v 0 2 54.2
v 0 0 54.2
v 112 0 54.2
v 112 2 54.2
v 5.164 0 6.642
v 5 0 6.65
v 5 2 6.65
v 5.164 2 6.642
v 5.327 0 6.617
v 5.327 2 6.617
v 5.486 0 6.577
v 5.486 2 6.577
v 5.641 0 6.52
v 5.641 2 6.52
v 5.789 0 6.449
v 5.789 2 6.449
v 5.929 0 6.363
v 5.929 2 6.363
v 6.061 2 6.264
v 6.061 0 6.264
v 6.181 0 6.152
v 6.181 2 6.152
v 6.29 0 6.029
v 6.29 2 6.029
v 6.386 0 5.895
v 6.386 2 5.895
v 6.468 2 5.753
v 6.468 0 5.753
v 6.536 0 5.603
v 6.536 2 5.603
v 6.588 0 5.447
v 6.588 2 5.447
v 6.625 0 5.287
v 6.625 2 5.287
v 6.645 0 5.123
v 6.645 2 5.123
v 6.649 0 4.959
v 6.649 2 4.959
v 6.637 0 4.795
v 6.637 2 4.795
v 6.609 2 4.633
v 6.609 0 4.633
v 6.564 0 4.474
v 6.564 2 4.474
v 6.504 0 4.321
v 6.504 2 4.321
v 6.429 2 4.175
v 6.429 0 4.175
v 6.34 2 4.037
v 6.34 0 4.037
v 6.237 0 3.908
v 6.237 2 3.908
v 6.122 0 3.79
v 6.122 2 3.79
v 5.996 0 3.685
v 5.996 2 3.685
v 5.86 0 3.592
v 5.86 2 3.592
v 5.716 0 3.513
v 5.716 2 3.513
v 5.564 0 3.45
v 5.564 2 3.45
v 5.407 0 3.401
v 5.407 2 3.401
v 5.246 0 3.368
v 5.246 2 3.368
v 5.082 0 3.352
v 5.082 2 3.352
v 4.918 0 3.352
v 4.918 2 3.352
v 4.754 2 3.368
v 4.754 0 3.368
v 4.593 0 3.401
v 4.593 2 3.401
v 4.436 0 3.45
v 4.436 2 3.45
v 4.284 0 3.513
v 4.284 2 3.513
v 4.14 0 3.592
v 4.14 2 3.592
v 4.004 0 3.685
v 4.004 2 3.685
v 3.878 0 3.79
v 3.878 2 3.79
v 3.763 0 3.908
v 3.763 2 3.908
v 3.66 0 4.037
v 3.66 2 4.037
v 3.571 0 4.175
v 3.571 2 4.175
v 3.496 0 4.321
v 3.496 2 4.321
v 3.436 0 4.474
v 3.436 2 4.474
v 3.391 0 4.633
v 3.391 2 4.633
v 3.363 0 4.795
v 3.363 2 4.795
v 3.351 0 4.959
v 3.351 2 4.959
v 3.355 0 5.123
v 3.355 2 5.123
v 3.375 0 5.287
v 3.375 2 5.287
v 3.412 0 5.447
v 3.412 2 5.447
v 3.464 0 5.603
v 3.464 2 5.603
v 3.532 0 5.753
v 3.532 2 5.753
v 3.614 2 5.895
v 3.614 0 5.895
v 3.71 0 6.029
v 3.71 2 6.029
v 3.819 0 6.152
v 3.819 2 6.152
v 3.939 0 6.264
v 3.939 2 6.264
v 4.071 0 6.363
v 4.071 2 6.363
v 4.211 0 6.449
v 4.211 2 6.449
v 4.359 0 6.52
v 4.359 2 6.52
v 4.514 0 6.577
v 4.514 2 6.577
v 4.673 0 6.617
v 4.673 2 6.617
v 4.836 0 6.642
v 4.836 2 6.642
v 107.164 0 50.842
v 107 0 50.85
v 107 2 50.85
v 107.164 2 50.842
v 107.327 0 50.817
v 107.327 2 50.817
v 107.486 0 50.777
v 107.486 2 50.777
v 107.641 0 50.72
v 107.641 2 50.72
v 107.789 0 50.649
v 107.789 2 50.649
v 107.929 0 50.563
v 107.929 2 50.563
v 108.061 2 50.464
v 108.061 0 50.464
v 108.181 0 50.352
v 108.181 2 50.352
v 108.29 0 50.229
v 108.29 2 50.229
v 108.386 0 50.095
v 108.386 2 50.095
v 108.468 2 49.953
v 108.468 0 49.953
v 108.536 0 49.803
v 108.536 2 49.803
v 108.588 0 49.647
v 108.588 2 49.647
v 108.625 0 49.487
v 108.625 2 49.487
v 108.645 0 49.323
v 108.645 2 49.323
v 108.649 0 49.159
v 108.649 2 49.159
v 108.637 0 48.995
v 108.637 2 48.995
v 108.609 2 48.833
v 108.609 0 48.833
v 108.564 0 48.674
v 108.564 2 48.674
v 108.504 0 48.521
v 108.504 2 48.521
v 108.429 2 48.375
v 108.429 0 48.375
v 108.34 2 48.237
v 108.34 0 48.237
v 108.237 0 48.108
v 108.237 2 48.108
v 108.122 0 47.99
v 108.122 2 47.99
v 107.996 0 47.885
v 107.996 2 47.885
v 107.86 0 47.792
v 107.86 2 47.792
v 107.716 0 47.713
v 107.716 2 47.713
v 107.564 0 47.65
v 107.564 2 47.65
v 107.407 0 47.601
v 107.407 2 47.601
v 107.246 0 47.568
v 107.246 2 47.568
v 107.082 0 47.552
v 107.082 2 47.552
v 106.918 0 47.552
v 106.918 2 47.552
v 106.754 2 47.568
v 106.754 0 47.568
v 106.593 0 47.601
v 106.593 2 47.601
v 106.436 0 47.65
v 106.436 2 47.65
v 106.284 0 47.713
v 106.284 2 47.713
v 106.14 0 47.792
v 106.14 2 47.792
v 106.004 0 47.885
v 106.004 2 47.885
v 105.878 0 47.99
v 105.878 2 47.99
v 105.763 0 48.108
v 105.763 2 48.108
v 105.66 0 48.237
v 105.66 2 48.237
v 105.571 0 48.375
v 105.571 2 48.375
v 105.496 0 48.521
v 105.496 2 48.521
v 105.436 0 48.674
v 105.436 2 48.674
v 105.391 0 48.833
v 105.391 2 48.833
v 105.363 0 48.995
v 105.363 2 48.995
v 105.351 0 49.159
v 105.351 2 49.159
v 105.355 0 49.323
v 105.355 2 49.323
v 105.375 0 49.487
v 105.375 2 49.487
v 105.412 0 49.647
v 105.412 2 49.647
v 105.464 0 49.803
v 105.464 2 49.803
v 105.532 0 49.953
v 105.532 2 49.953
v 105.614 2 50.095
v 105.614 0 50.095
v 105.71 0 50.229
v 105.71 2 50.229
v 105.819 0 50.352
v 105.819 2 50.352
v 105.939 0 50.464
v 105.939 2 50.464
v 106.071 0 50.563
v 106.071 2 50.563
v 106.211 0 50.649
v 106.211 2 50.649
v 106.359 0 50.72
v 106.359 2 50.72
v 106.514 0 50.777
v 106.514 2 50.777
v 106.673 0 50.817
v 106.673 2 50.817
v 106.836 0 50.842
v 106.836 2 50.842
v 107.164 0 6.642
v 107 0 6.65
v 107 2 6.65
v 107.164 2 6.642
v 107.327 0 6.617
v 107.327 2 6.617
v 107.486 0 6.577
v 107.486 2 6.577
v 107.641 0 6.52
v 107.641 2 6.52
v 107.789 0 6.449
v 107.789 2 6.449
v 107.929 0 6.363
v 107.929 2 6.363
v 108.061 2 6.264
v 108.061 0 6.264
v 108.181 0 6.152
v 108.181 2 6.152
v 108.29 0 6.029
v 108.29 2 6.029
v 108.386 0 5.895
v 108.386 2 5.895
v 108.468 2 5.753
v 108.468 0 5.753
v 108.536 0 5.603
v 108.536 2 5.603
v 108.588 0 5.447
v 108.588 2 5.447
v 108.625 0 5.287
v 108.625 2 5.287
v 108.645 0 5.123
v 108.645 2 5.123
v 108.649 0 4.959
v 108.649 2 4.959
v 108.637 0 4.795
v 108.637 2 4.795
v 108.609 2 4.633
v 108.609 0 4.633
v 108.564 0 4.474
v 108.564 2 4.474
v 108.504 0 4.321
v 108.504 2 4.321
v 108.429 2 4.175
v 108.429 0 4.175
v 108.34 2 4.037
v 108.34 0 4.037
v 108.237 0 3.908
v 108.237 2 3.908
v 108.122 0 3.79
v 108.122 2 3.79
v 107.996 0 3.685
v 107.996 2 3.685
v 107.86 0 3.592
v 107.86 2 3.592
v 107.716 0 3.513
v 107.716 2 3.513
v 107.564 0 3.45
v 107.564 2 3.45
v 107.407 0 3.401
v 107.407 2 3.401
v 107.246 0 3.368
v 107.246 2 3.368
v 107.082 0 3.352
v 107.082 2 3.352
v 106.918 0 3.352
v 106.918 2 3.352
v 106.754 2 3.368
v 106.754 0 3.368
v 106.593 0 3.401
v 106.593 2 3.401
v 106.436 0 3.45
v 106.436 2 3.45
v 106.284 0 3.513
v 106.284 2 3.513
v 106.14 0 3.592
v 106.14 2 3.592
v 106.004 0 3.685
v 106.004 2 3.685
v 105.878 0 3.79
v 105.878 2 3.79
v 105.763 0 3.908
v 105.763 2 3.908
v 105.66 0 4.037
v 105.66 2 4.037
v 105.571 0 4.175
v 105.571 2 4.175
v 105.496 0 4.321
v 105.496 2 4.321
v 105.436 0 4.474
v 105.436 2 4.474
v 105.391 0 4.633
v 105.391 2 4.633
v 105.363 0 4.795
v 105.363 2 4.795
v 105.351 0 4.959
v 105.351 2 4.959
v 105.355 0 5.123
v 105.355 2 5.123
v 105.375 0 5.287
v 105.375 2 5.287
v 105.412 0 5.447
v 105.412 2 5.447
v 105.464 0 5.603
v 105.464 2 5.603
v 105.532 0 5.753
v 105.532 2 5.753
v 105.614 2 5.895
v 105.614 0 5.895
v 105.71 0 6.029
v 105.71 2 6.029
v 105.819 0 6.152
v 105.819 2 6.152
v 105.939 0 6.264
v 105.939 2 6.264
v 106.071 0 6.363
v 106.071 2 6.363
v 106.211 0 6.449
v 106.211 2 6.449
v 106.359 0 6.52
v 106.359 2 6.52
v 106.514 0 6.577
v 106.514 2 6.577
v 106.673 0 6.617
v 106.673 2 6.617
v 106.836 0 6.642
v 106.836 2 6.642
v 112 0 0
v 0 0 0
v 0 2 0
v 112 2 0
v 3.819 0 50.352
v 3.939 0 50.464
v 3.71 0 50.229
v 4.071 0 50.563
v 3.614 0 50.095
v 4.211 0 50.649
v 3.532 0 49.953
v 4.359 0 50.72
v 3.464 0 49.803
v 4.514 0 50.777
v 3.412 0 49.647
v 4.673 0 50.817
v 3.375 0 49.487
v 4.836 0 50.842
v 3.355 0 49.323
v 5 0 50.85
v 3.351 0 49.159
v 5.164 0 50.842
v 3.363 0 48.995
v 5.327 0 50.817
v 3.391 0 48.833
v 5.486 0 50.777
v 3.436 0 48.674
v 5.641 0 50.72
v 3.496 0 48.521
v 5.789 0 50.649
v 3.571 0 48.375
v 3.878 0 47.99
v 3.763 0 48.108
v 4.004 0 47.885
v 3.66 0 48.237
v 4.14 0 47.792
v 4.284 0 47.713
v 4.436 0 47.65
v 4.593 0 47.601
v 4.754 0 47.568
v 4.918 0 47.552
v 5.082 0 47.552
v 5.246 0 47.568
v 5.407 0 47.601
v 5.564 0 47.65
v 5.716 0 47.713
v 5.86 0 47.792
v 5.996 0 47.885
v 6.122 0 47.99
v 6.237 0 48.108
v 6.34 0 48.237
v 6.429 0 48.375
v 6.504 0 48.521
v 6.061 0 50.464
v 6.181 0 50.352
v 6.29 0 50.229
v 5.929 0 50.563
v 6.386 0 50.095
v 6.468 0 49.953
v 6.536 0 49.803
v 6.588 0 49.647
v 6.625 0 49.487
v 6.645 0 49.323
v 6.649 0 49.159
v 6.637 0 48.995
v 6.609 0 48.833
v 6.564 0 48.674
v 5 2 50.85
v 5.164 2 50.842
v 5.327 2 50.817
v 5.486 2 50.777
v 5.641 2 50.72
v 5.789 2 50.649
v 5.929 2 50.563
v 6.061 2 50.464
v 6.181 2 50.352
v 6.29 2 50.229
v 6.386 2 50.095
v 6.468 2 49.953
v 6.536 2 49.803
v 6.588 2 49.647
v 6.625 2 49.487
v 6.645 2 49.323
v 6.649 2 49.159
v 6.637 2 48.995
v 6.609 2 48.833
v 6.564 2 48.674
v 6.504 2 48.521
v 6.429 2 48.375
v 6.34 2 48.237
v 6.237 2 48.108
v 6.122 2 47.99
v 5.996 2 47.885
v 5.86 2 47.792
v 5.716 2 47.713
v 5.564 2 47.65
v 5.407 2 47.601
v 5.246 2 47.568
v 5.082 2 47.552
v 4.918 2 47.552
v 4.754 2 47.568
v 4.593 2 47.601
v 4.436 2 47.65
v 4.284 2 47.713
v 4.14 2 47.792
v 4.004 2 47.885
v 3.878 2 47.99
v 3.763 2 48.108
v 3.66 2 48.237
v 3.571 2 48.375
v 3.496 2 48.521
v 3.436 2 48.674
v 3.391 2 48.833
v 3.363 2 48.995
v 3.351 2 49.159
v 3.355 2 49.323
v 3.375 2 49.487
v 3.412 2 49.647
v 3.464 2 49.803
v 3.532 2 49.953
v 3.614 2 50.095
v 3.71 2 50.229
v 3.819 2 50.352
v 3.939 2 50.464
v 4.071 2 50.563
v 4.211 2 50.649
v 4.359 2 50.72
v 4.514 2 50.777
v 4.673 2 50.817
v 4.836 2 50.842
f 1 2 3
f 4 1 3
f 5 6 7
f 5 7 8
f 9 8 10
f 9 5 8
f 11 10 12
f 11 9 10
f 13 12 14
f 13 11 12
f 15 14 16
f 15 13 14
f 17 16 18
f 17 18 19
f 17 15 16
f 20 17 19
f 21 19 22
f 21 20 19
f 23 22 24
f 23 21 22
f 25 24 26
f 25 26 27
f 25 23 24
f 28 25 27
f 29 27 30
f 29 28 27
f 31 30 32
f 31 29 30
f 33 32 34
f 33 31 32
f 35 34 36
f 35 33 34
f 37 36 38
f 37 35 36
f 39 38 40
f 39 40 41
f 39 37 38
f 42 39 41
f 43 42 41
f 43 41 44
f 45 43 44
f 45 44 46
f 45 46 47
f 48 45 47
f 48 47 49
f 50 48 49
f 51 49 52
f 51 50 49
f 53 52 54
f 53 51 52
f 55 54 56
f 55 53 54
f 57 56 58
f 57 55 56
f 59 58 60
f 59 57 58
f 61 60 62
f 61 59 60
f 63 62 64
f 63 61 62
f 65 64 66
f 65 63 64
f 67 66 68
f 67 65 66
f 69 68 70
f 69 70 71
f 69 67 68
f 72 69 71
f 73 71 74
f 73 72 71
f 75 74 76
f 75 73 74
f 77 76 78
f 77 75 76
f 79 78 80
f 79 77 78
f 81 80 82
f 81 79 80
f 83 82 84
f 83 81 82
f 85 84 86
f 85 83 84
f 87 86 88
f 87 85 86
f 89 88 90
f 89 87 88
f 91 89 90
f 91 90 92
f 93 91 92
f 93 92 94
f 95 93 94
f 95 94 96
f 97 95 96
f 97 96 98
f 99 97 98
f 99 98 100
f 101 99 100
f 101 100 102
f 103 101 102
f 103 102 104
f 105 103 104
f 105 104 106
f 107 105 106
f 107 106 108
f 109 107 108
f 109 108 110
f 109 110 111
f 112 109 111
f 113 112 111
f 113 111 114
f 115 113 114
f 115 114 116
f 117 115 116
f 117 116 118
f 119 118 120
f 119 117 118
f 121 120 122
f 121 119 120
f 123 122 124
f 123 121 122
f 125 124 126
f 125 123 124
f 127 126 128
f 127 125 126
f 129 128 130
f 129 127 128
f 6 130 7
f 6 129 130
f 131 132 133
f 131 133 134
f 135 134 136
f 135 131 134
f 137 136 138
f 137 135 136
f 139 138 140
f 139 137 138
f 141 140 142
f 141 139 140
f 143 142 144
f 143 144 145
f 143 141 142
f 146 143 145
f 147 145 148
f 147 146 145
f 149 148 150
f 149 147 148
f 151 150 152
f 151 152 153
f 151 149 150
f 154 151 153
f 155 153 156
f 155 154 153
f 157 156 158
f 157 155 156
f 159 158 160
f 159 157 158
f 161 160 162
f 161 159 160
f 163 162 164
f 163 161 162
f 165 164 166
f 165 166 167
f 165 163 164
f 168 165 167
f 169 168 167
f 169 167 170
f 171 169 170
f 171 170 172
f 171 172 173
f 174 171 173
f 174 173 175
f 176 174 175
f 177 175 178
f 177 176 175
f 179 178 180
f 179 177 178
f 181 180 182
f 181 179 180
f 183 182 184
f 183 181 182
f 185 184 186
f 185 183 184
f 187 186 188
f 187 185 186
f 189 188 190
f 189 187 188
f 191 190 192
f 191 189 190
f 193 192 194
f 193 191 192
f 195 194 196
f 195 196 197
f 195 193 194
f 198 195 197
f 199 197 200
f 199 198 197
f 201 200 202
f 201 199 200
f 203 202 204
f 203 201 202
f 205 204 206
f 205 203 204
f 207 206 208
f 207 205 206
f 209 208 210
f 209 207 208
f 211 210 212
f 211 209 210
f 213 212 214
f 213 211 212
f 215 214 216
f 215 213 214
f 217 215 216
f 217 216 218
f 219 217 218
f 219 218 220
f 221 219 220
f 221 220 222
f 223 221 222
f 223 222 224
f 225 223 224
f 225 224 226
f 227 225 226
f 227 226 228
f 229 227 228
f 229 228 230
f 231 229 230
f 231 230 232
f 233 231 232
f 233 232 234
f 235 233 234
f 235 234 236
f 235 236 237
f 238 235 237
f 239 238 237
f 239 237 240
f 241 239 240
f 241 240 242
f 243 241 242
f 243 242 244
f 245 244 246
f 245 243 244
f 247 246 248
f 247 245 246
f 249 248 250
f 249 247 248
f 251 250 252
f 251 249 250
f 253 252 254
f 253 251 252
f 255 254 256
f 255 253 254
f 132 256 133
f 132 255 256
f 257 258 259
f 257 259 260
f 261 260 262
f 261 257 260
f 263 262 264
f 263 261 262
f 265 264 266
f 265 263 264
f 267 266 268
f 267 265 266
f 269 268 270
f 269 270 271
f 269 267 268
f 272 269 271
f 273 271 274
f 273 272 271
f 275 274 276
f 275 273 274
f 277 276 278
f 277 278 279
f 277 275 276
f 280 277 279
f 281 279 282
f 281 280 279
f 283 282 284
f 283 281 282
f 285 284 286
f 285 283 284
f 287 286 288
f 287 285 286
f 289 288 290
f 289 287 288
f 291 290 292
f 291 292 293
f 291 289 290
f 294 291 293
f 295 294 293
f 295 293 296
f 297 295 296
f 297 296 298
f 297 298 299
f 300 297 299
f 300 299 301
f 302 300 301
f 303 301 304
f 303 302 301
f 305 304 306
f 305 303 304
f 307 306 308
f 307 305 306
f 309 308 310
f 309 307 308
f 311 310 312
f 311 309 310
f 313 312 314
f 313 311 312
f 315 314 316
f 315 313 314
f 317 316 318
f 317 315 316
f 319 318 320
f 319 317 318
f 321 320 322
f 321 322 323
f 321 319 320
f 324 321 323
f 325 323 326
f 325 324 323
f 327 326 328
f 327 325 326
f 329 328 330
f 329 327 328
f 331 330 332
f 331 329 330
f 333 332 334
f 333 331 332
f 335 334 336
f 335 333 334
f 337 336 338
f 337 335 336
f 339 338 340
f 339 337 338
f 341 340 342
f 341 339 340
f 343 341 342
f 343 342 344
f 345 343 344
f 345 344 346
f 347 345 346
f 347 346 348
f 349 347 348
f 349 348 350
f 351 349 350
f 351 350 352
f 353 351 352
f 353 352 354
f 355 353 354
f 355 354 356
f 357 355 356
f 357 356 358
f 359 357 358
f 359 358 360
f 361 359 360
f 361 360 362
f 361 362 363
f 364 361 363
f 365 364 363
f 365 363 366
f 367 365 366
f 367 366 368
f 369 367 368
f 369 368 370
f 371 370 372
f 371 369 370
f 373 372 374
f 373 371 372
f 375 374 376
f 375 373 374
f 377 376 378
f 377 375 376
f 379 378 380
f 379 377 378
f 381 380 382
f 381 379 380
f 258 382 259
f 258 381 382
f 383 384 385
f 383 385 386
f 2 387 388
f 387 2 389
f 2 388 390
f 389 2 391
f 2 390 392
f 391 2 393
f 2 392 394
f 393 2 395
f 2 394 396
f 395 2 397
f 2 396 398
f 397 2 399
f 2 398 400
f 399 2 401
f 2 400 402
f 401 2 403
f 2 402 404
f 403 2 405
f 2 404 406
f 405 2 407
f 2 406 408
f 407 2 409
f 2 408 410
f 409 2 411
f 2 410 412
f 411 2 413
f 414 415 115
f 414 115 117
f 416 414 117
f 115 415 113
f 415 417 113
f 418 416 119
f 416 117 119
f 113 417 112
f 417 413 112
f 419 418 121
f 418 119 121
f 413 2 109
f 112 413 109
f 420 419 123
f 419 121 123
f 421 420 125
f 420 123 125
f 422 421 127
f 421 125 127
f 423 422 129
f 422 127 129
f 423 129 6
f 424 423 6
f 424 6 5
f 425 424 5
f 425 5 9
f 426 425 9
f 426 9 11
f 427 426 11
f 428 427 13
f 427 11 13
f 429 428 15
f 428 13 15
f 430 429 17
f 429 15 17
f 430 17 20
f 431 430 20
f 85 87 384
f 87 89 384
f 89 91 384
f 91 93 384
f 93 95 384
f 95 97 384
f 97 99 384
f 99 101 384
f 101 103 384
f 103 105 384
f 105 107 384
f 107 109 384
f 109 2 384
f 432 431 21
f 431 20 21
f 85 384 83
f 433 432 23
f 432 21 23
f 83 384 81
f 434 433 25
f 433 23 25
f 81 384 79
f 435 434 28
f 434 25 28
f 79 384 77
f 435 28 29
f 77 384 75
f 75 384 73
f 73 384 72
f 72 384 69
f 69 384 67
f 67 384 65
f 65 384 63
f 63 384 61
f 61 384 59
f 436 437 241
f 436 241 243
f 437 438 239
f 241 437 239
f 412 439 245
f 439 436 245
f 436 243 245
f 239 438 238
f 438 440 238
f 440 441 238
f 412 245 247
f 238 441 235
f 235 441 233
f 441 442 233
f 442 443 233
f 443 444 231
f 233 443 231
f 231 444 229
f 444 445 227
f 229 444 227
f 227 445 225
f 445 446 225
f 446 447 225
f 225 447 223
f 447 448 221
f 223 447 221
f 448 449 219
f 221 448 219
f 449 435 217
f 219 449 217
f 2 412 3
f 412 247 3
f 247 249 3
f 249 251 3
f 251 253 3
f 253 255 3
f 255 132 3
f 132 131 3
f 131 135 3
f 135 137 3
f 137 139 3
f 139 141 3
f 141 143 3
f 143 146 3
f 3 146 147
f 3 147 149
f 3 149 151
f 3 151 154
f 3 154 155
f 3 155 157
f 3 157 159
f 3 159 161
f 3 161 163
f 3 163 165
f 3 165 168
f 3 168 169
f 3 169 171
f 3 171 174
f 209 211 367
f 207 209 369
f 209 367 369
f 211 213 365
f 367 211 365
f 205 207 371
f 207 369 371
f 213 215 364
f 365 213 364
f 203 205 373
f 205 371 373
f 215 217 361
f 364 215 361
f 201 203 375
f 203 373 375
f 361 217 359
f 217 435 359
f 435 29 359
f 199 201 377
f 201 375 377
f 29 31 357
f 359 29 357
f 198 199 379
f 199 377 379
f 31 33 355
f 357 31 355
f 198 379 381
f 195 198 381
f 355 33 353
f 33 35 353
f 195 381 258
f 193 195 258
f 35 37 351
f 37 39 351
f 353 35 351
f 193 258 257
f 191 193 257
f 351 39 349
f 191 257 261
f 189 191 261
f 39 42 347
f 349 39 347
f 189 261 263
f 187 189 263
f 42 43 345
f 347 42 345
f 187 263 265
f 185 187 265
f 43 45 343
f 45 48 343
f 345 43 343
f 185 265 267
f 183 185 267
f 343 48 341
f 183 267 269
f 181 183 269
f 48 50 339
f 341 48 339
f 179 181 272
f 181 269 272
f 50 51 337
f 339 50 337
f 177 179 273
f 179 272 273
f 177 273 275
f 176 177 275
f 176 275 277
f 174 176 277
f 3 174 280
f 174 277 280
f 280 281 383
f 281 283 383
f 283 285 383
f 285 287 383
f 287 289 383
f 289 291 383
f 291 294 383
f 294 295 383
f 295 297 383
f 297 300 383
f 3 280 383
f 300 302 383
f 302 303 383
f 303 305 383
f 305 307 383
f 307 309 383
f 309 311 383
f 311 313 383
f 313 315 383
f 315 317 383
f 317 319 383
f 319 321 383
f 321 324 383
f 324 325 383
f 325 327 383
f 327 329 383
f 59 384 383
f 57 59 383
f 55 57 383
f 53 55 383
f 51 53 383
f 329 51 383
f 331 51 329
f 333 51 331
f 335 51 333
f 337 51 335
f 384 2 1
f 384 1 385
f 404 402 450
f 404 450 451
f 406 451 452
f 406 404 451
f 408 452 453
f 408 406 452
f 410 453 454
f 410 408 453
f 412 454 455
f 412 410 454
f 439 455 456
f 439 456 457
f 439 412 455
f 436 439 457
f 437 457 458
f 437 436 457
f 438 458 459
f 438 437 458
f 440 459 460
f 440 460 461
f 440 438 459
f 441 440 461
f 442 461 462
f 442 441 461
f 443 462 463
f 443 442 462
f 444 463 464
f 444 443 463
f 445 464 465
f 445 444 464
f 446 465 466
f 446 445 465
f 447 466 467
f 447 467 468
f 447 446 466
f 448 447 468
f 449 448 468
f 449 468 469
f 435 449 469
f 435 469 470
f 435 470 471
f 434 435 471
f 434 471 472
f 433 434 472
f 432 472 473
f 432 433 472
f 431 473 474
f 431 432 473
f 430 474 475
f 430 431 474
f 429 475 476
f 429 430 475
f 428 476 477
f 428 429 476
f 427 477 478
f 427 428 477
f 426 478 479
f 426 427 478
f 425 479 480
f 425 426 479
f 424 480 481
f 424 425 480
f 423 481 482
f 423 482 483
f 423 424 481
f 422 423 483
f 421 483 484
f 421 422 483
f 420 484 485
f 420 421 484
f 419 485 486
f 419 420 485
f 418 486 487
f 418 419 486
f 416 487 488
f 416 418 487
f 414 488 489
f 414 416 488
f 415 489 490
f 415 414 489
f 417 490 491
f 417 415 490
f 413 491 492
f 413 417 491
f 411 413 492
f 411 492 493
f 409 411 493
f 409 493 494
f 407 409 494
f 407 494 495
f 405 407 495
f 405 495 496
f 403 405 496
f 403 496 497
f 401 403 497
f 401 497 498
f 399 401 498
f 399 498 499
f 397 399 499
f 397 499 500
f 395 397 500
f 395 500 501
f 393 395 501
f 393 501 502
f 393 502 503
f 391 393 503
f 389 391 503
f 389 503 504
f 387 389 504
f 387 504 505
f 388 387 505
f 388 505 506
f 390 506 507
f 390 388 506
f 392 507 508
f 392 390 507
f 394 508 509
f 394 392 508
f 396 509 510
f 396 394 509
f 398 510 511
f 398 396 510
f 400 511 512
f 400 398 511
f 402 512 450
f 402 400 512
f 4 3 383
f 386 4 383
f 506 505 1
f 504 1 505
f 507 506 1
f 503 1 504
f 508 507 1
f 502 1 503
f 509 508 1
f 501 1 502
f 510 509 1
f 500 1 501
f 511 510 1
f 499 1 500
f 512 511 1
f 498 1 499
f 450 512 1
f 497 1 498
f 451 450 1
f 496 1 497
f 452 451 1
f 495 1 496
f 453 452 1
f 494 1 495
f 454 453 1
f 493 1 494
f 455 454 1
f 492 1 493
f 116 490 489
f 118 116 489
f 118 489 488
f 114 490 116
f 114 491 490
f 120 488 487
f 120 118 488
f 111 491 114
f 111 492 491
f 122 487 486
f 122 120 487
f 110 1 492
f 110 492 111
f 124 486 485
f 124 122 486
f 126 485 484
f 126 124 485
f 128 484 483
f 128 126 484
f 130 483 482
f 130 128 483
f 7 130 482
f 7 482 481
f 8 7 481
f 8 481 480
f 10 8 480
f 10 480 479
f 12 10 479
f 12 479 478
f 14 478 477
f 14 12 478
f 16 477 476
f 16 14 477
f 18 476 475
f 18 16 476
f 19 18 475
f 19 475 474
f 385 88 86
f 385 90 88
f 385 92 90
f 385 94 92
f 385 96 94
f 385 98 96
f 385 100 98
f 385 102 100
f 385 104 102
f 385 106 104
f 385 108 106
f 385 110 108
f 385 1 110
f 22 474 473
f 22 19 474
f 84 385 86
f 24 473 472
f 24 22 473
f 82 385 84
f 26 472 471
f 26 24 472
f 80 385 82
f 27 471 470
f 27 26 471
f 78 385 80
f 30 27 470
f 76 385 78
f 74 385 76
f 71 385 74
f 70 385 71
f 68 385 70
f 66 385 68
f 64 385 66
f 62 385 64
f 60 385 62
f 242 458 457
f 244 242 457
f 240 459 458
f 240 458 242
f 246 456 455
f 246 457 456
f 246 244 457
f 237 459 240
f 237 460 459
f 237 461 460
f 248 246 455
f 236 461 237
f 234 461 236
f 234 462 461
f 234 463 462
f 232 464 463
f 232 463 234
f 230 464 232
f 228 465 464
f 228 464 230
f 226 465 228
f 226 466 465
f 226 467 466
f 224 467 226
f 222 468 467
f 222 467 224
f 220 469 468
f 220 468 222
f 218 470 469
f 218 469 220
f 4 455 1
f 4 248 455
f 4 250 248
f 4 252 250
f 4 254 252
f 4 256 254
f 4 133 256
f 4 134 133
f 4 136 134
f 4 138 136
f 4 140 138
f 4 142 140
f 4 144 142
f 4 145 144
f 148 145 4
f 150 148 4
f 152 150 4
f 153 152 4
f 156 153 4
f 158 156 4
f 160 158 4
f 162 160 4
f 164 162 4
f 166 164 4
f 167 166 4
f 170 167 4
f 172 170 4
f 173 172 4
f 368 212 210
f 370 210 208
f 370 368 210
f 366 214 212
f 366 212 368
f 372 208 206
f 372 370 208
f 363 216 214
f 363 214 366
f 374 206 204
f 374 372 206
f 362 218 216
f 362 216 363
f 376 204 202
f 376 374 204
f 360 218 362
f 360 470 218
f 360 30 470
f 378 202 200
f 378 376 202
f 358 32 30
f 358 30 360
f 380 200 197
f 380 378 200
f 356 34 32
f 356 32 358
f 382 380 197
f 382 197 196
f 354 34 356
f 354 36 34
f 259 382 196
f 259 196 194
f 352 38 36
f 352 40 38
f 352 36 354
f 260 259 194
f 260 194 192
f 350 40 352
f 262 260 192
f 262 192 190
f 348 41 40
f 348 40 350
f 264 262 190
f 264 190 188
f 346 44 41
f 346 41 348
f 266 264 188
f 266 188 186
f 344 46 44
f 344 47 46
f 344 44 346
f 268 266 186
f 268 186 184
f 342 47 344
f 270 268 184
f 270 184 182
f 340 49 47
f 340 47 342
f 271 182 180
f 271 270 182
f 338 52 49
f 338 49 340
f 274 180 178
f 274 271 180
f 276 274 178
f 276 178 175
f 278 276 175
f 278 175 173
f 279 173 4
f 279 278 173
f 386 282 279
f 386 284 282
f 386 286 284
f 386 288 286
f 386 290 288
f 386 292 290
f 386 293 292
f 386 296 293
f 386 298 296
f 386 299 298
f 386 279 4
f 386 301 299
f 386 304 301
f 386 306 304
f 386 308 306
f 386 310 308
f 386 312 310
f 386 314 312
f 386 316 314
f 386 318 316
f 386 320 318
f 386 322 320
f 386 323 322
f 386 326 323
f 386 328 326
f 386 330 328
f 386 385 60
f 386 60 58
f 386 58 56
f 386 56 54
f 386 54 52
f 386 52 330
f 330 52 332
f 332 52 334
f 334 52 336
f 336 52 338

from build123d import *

# Parameters (mm, degrees)
SKETCH_1_W      = 112
SKETCH_1_H      = 54.2
SKETCH_1_R      = 1.65
EXTRUDE_1_DEPTH = 2


with BuildPart() as part:
    # 草图1 → 凸台-拉伸1 (new body)
    with BuildSketch(Plane(origin=(0, 0, 0), x_dir=(1, 0, 0), z_dir=(0, 1, 0))):
        with Locations((56, -27.1)):
            Rectangle(SKETCH_1_W, SKETCH_1_H)
        with Locations(Location((5, -5, 0), (0, 0, 270))):
            Circle(SKETCH_1_R, mode=Mode.SUBTRACT)
        with Locations(Location((107, -5, 0), (0, 0, 270))):
            Circle(SKETCH_1_R, mode=Mode.SUBTRACT)
        with Locations(Location((107, -49.2, 0), (0, 0, 270))):
            Circle(SKETCH_1_R, mode=Mode.SUBTRACT)
        with Locations(Location((5, -49.2, 0), (0, 0, 270))):
            Circle(SKETCH_1_R, mode=Mode.SUBTRACT)
    extrude(amount=EXTRUDE_1_DEPTH)


solid = part.part
